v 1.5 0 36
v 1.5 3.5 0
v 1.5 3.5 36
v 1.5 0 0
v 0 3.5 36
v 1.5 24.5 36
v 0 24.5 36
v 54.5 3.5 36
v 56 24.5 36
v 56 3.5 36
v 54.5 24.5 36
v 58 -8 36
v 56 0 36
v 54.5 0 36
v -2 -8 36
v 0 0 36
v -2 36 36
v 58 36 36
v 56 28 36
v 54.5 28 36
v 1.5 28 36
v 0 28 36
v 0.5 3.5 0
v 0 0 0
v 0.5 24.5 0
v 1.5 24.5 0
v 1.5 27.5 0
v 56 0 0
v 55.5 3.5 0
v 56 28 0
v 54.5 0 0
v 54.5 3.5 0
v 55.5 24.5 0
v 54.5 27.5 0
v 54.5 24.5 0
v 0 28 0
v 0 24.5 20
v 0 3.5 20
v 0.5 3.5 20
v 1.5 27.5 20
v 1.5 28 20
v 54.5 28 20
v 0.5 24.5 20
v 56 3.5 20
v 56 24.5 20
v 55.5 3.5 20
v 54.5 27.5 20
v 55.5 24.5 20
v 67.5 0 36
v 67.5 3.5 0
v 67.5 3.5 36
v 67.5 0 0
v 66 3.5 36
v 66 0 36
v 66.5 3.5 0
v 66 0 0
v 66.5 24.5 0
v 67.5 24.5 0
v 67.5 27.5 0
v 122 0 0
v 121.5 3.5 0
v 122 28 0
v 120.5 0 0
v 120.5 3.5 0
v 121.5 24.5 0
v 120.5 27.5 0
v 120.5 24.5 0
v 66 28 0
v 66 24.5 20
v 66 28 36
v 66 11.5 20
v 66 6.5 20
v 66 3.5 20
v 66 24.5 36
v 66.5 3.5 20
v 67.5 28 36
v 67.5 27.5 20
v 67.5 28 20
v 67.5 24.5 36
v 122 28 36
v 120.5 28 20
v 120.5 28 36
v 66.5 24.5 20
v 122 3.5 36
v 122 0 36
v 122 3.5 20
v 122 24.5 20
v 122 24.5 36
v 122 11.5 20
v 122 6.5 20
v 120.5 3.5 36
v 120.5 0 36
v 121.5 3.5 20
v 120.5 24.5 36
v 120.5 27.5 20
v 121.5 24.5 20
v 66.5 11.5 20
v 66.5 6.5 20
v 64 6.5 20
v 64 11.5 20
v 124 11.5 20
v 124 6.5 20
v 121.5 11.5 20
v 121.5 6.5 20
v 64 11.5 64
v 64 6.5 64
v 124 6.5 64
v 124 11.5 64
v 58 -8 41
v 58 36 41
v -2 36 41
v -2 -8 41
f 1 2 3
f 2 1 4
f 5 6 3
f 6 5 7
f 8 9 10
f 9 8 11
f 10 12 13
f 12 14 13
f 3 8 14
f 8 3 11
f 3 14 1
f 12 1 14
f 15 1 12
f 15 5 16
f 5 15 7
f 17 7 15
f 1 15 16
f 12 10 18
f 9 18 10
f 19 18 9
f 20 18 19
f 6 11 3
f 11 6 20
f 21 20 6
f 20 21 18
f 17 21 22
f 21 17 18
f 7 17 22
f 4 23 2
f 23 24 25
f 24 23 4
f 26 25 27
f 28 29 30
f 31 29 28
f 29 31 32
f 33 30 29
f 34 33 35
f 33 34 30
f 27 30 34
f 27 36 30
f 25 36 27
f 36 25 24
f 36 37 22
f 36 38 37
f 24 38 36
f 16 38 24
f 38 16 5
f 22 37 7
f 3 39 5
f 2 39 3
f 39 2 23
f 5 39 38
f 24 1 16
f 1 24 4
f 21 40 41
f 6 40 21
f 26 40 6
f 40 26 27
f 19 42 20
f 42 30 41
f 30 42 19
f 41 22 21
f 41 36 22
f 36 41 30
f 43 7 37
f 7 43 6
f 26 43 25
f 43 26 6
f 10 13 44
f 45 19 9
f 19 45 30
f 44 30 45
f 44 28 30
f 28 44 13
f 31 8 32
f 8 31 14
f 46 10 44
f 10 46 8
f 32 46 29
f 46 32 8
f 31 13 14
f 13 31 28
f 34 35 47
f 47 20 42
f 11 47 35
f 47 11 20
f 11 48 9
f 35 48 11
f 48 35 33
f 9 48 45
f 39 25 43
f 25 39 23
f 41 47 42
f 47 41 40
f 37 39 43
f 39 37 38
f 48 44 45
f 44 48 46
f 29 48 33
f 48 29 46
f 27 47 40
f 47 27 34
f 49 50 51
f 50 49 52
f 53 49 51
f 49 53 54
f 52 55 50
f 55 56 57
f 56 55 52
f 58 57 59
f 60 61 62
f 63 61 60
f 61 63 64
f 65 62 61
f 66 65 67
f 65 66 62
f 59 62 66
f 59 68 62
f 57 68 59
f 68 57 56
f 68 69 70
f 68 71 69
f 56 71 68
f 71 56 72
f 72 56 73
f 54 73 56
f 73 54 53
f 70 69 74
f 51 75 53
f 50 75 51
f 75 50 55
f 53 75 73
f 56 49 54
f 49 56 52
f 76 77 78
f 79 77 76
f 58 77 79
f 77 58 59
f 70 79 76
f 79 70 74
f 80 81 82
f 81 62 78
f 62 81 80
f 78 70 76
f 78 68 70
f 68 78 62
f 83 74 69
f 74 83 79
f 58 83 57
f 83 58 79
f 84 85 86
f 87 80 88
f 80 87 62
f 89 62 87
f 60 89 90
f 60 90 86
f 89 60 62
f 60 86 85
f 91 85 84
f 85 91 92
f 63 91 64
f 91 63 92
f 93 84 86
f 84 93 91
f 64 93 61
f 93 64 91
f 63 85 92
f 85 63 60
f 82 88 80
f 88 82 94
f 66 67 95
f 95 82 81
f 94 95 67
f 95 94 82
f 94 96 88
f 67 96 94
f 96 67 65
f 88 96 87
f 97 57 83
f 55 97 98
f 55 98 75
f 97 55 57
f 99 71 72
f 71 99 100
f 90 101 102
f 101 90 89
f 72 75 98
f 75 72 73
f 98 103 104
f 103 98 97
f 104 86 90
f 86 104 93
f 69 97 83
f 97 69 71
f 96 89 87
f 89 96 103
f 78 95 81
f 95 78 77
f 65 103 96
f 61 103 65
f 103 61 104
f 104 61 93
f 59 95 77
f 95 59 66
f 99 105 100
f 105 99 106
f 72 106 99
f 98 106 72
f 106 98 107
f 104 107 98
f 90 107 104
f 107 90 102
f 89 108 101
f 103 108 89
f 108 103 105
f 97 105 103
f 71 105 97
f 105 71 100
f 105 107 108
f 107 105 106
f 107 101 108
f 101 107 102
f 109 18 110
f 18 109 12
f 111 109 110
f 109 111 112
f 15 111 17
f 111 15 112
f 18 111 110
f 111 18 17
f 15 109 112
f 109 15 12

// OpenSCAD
// Workbench Sketch: Normal Use vs Transit Use
// Updated with correct dimensions and box resting on panels in transit
// Dimensions in inches

// Display resolution for rendering
$fn = 4;

// --- Parameters ---
// Torsion box
torsion_x   = 60; // width (front-to-back)
torsion_y   = 44; // depth (left-to-right)
torsion_th  = 5;  // thickness

// Legs
leg_w       = 1.5;
leg_d       = 3.5;
leg_h       = 36;
leg_span_x  = 56; // footprint width (front-to-back)
leg_span_y  = 28; // footprint depth (left-to-right)

// Sheathing panels
panel_h     = 20;
panel_th    = 0.5;

// --- Modules ---

// Four corner legs
module legs() {
    for (x = [0, leg_span_x - leg_w], y = [0, leg_span_y - leg_d]) {
        translate([x, y, 0])
            cube([leg_w, leg_d, leg_h]);
    }
}

// Side (left, right) and back panels
module panels() {
    // Left side panel
    translate([0, 0, 0])
        cube([panel_th, leg_span_y, panel_h]);
    // Right side panel
    translate([leg_span_x - panel_th, 0, 0])
        cube([panel_th, leg_span_y, panel_h]);
    // Back panel
    translate([0, leg_span_y - panel_th, 0])
        cube([leg_span_x, panel_th, panel_h]);
}

// Torsion box in normal (horizontal) or transit (vertical) mode
module torsion(normal = true) {
    if (normal) {
        // Horizontal: rest on top of legs
        translate([
            (leg_span_x - torsion_x)/2,
            (leg_span_y - torsion_y)/2,
            leg_h
        ])
            cube([torsion_x, torsion_y, torsion_th]);
    } else {
        // Vertical: rest on top of side/back panels
        translate([
            (leg_span_x - torsion_x)/2,
            (leg_span_y - torsion_th)/2,
            panel_h
        ])
            rotate([90, 0, 0]) // rotate +90° to lift box so Y maps to Z
                cube([torsion_x, torsion_y, torsion_th]);
    }
}

// --- Scenes ---

// 1) Normal use configuration
legs();
panels();
torsion(true);

// 2) Transit use (shifted by leg_span_x+10 in X for side-by-side view)
translate([leg_span_x + 10, 0, 0]) {
    legs();
    panels();
    torsion(false);
}
